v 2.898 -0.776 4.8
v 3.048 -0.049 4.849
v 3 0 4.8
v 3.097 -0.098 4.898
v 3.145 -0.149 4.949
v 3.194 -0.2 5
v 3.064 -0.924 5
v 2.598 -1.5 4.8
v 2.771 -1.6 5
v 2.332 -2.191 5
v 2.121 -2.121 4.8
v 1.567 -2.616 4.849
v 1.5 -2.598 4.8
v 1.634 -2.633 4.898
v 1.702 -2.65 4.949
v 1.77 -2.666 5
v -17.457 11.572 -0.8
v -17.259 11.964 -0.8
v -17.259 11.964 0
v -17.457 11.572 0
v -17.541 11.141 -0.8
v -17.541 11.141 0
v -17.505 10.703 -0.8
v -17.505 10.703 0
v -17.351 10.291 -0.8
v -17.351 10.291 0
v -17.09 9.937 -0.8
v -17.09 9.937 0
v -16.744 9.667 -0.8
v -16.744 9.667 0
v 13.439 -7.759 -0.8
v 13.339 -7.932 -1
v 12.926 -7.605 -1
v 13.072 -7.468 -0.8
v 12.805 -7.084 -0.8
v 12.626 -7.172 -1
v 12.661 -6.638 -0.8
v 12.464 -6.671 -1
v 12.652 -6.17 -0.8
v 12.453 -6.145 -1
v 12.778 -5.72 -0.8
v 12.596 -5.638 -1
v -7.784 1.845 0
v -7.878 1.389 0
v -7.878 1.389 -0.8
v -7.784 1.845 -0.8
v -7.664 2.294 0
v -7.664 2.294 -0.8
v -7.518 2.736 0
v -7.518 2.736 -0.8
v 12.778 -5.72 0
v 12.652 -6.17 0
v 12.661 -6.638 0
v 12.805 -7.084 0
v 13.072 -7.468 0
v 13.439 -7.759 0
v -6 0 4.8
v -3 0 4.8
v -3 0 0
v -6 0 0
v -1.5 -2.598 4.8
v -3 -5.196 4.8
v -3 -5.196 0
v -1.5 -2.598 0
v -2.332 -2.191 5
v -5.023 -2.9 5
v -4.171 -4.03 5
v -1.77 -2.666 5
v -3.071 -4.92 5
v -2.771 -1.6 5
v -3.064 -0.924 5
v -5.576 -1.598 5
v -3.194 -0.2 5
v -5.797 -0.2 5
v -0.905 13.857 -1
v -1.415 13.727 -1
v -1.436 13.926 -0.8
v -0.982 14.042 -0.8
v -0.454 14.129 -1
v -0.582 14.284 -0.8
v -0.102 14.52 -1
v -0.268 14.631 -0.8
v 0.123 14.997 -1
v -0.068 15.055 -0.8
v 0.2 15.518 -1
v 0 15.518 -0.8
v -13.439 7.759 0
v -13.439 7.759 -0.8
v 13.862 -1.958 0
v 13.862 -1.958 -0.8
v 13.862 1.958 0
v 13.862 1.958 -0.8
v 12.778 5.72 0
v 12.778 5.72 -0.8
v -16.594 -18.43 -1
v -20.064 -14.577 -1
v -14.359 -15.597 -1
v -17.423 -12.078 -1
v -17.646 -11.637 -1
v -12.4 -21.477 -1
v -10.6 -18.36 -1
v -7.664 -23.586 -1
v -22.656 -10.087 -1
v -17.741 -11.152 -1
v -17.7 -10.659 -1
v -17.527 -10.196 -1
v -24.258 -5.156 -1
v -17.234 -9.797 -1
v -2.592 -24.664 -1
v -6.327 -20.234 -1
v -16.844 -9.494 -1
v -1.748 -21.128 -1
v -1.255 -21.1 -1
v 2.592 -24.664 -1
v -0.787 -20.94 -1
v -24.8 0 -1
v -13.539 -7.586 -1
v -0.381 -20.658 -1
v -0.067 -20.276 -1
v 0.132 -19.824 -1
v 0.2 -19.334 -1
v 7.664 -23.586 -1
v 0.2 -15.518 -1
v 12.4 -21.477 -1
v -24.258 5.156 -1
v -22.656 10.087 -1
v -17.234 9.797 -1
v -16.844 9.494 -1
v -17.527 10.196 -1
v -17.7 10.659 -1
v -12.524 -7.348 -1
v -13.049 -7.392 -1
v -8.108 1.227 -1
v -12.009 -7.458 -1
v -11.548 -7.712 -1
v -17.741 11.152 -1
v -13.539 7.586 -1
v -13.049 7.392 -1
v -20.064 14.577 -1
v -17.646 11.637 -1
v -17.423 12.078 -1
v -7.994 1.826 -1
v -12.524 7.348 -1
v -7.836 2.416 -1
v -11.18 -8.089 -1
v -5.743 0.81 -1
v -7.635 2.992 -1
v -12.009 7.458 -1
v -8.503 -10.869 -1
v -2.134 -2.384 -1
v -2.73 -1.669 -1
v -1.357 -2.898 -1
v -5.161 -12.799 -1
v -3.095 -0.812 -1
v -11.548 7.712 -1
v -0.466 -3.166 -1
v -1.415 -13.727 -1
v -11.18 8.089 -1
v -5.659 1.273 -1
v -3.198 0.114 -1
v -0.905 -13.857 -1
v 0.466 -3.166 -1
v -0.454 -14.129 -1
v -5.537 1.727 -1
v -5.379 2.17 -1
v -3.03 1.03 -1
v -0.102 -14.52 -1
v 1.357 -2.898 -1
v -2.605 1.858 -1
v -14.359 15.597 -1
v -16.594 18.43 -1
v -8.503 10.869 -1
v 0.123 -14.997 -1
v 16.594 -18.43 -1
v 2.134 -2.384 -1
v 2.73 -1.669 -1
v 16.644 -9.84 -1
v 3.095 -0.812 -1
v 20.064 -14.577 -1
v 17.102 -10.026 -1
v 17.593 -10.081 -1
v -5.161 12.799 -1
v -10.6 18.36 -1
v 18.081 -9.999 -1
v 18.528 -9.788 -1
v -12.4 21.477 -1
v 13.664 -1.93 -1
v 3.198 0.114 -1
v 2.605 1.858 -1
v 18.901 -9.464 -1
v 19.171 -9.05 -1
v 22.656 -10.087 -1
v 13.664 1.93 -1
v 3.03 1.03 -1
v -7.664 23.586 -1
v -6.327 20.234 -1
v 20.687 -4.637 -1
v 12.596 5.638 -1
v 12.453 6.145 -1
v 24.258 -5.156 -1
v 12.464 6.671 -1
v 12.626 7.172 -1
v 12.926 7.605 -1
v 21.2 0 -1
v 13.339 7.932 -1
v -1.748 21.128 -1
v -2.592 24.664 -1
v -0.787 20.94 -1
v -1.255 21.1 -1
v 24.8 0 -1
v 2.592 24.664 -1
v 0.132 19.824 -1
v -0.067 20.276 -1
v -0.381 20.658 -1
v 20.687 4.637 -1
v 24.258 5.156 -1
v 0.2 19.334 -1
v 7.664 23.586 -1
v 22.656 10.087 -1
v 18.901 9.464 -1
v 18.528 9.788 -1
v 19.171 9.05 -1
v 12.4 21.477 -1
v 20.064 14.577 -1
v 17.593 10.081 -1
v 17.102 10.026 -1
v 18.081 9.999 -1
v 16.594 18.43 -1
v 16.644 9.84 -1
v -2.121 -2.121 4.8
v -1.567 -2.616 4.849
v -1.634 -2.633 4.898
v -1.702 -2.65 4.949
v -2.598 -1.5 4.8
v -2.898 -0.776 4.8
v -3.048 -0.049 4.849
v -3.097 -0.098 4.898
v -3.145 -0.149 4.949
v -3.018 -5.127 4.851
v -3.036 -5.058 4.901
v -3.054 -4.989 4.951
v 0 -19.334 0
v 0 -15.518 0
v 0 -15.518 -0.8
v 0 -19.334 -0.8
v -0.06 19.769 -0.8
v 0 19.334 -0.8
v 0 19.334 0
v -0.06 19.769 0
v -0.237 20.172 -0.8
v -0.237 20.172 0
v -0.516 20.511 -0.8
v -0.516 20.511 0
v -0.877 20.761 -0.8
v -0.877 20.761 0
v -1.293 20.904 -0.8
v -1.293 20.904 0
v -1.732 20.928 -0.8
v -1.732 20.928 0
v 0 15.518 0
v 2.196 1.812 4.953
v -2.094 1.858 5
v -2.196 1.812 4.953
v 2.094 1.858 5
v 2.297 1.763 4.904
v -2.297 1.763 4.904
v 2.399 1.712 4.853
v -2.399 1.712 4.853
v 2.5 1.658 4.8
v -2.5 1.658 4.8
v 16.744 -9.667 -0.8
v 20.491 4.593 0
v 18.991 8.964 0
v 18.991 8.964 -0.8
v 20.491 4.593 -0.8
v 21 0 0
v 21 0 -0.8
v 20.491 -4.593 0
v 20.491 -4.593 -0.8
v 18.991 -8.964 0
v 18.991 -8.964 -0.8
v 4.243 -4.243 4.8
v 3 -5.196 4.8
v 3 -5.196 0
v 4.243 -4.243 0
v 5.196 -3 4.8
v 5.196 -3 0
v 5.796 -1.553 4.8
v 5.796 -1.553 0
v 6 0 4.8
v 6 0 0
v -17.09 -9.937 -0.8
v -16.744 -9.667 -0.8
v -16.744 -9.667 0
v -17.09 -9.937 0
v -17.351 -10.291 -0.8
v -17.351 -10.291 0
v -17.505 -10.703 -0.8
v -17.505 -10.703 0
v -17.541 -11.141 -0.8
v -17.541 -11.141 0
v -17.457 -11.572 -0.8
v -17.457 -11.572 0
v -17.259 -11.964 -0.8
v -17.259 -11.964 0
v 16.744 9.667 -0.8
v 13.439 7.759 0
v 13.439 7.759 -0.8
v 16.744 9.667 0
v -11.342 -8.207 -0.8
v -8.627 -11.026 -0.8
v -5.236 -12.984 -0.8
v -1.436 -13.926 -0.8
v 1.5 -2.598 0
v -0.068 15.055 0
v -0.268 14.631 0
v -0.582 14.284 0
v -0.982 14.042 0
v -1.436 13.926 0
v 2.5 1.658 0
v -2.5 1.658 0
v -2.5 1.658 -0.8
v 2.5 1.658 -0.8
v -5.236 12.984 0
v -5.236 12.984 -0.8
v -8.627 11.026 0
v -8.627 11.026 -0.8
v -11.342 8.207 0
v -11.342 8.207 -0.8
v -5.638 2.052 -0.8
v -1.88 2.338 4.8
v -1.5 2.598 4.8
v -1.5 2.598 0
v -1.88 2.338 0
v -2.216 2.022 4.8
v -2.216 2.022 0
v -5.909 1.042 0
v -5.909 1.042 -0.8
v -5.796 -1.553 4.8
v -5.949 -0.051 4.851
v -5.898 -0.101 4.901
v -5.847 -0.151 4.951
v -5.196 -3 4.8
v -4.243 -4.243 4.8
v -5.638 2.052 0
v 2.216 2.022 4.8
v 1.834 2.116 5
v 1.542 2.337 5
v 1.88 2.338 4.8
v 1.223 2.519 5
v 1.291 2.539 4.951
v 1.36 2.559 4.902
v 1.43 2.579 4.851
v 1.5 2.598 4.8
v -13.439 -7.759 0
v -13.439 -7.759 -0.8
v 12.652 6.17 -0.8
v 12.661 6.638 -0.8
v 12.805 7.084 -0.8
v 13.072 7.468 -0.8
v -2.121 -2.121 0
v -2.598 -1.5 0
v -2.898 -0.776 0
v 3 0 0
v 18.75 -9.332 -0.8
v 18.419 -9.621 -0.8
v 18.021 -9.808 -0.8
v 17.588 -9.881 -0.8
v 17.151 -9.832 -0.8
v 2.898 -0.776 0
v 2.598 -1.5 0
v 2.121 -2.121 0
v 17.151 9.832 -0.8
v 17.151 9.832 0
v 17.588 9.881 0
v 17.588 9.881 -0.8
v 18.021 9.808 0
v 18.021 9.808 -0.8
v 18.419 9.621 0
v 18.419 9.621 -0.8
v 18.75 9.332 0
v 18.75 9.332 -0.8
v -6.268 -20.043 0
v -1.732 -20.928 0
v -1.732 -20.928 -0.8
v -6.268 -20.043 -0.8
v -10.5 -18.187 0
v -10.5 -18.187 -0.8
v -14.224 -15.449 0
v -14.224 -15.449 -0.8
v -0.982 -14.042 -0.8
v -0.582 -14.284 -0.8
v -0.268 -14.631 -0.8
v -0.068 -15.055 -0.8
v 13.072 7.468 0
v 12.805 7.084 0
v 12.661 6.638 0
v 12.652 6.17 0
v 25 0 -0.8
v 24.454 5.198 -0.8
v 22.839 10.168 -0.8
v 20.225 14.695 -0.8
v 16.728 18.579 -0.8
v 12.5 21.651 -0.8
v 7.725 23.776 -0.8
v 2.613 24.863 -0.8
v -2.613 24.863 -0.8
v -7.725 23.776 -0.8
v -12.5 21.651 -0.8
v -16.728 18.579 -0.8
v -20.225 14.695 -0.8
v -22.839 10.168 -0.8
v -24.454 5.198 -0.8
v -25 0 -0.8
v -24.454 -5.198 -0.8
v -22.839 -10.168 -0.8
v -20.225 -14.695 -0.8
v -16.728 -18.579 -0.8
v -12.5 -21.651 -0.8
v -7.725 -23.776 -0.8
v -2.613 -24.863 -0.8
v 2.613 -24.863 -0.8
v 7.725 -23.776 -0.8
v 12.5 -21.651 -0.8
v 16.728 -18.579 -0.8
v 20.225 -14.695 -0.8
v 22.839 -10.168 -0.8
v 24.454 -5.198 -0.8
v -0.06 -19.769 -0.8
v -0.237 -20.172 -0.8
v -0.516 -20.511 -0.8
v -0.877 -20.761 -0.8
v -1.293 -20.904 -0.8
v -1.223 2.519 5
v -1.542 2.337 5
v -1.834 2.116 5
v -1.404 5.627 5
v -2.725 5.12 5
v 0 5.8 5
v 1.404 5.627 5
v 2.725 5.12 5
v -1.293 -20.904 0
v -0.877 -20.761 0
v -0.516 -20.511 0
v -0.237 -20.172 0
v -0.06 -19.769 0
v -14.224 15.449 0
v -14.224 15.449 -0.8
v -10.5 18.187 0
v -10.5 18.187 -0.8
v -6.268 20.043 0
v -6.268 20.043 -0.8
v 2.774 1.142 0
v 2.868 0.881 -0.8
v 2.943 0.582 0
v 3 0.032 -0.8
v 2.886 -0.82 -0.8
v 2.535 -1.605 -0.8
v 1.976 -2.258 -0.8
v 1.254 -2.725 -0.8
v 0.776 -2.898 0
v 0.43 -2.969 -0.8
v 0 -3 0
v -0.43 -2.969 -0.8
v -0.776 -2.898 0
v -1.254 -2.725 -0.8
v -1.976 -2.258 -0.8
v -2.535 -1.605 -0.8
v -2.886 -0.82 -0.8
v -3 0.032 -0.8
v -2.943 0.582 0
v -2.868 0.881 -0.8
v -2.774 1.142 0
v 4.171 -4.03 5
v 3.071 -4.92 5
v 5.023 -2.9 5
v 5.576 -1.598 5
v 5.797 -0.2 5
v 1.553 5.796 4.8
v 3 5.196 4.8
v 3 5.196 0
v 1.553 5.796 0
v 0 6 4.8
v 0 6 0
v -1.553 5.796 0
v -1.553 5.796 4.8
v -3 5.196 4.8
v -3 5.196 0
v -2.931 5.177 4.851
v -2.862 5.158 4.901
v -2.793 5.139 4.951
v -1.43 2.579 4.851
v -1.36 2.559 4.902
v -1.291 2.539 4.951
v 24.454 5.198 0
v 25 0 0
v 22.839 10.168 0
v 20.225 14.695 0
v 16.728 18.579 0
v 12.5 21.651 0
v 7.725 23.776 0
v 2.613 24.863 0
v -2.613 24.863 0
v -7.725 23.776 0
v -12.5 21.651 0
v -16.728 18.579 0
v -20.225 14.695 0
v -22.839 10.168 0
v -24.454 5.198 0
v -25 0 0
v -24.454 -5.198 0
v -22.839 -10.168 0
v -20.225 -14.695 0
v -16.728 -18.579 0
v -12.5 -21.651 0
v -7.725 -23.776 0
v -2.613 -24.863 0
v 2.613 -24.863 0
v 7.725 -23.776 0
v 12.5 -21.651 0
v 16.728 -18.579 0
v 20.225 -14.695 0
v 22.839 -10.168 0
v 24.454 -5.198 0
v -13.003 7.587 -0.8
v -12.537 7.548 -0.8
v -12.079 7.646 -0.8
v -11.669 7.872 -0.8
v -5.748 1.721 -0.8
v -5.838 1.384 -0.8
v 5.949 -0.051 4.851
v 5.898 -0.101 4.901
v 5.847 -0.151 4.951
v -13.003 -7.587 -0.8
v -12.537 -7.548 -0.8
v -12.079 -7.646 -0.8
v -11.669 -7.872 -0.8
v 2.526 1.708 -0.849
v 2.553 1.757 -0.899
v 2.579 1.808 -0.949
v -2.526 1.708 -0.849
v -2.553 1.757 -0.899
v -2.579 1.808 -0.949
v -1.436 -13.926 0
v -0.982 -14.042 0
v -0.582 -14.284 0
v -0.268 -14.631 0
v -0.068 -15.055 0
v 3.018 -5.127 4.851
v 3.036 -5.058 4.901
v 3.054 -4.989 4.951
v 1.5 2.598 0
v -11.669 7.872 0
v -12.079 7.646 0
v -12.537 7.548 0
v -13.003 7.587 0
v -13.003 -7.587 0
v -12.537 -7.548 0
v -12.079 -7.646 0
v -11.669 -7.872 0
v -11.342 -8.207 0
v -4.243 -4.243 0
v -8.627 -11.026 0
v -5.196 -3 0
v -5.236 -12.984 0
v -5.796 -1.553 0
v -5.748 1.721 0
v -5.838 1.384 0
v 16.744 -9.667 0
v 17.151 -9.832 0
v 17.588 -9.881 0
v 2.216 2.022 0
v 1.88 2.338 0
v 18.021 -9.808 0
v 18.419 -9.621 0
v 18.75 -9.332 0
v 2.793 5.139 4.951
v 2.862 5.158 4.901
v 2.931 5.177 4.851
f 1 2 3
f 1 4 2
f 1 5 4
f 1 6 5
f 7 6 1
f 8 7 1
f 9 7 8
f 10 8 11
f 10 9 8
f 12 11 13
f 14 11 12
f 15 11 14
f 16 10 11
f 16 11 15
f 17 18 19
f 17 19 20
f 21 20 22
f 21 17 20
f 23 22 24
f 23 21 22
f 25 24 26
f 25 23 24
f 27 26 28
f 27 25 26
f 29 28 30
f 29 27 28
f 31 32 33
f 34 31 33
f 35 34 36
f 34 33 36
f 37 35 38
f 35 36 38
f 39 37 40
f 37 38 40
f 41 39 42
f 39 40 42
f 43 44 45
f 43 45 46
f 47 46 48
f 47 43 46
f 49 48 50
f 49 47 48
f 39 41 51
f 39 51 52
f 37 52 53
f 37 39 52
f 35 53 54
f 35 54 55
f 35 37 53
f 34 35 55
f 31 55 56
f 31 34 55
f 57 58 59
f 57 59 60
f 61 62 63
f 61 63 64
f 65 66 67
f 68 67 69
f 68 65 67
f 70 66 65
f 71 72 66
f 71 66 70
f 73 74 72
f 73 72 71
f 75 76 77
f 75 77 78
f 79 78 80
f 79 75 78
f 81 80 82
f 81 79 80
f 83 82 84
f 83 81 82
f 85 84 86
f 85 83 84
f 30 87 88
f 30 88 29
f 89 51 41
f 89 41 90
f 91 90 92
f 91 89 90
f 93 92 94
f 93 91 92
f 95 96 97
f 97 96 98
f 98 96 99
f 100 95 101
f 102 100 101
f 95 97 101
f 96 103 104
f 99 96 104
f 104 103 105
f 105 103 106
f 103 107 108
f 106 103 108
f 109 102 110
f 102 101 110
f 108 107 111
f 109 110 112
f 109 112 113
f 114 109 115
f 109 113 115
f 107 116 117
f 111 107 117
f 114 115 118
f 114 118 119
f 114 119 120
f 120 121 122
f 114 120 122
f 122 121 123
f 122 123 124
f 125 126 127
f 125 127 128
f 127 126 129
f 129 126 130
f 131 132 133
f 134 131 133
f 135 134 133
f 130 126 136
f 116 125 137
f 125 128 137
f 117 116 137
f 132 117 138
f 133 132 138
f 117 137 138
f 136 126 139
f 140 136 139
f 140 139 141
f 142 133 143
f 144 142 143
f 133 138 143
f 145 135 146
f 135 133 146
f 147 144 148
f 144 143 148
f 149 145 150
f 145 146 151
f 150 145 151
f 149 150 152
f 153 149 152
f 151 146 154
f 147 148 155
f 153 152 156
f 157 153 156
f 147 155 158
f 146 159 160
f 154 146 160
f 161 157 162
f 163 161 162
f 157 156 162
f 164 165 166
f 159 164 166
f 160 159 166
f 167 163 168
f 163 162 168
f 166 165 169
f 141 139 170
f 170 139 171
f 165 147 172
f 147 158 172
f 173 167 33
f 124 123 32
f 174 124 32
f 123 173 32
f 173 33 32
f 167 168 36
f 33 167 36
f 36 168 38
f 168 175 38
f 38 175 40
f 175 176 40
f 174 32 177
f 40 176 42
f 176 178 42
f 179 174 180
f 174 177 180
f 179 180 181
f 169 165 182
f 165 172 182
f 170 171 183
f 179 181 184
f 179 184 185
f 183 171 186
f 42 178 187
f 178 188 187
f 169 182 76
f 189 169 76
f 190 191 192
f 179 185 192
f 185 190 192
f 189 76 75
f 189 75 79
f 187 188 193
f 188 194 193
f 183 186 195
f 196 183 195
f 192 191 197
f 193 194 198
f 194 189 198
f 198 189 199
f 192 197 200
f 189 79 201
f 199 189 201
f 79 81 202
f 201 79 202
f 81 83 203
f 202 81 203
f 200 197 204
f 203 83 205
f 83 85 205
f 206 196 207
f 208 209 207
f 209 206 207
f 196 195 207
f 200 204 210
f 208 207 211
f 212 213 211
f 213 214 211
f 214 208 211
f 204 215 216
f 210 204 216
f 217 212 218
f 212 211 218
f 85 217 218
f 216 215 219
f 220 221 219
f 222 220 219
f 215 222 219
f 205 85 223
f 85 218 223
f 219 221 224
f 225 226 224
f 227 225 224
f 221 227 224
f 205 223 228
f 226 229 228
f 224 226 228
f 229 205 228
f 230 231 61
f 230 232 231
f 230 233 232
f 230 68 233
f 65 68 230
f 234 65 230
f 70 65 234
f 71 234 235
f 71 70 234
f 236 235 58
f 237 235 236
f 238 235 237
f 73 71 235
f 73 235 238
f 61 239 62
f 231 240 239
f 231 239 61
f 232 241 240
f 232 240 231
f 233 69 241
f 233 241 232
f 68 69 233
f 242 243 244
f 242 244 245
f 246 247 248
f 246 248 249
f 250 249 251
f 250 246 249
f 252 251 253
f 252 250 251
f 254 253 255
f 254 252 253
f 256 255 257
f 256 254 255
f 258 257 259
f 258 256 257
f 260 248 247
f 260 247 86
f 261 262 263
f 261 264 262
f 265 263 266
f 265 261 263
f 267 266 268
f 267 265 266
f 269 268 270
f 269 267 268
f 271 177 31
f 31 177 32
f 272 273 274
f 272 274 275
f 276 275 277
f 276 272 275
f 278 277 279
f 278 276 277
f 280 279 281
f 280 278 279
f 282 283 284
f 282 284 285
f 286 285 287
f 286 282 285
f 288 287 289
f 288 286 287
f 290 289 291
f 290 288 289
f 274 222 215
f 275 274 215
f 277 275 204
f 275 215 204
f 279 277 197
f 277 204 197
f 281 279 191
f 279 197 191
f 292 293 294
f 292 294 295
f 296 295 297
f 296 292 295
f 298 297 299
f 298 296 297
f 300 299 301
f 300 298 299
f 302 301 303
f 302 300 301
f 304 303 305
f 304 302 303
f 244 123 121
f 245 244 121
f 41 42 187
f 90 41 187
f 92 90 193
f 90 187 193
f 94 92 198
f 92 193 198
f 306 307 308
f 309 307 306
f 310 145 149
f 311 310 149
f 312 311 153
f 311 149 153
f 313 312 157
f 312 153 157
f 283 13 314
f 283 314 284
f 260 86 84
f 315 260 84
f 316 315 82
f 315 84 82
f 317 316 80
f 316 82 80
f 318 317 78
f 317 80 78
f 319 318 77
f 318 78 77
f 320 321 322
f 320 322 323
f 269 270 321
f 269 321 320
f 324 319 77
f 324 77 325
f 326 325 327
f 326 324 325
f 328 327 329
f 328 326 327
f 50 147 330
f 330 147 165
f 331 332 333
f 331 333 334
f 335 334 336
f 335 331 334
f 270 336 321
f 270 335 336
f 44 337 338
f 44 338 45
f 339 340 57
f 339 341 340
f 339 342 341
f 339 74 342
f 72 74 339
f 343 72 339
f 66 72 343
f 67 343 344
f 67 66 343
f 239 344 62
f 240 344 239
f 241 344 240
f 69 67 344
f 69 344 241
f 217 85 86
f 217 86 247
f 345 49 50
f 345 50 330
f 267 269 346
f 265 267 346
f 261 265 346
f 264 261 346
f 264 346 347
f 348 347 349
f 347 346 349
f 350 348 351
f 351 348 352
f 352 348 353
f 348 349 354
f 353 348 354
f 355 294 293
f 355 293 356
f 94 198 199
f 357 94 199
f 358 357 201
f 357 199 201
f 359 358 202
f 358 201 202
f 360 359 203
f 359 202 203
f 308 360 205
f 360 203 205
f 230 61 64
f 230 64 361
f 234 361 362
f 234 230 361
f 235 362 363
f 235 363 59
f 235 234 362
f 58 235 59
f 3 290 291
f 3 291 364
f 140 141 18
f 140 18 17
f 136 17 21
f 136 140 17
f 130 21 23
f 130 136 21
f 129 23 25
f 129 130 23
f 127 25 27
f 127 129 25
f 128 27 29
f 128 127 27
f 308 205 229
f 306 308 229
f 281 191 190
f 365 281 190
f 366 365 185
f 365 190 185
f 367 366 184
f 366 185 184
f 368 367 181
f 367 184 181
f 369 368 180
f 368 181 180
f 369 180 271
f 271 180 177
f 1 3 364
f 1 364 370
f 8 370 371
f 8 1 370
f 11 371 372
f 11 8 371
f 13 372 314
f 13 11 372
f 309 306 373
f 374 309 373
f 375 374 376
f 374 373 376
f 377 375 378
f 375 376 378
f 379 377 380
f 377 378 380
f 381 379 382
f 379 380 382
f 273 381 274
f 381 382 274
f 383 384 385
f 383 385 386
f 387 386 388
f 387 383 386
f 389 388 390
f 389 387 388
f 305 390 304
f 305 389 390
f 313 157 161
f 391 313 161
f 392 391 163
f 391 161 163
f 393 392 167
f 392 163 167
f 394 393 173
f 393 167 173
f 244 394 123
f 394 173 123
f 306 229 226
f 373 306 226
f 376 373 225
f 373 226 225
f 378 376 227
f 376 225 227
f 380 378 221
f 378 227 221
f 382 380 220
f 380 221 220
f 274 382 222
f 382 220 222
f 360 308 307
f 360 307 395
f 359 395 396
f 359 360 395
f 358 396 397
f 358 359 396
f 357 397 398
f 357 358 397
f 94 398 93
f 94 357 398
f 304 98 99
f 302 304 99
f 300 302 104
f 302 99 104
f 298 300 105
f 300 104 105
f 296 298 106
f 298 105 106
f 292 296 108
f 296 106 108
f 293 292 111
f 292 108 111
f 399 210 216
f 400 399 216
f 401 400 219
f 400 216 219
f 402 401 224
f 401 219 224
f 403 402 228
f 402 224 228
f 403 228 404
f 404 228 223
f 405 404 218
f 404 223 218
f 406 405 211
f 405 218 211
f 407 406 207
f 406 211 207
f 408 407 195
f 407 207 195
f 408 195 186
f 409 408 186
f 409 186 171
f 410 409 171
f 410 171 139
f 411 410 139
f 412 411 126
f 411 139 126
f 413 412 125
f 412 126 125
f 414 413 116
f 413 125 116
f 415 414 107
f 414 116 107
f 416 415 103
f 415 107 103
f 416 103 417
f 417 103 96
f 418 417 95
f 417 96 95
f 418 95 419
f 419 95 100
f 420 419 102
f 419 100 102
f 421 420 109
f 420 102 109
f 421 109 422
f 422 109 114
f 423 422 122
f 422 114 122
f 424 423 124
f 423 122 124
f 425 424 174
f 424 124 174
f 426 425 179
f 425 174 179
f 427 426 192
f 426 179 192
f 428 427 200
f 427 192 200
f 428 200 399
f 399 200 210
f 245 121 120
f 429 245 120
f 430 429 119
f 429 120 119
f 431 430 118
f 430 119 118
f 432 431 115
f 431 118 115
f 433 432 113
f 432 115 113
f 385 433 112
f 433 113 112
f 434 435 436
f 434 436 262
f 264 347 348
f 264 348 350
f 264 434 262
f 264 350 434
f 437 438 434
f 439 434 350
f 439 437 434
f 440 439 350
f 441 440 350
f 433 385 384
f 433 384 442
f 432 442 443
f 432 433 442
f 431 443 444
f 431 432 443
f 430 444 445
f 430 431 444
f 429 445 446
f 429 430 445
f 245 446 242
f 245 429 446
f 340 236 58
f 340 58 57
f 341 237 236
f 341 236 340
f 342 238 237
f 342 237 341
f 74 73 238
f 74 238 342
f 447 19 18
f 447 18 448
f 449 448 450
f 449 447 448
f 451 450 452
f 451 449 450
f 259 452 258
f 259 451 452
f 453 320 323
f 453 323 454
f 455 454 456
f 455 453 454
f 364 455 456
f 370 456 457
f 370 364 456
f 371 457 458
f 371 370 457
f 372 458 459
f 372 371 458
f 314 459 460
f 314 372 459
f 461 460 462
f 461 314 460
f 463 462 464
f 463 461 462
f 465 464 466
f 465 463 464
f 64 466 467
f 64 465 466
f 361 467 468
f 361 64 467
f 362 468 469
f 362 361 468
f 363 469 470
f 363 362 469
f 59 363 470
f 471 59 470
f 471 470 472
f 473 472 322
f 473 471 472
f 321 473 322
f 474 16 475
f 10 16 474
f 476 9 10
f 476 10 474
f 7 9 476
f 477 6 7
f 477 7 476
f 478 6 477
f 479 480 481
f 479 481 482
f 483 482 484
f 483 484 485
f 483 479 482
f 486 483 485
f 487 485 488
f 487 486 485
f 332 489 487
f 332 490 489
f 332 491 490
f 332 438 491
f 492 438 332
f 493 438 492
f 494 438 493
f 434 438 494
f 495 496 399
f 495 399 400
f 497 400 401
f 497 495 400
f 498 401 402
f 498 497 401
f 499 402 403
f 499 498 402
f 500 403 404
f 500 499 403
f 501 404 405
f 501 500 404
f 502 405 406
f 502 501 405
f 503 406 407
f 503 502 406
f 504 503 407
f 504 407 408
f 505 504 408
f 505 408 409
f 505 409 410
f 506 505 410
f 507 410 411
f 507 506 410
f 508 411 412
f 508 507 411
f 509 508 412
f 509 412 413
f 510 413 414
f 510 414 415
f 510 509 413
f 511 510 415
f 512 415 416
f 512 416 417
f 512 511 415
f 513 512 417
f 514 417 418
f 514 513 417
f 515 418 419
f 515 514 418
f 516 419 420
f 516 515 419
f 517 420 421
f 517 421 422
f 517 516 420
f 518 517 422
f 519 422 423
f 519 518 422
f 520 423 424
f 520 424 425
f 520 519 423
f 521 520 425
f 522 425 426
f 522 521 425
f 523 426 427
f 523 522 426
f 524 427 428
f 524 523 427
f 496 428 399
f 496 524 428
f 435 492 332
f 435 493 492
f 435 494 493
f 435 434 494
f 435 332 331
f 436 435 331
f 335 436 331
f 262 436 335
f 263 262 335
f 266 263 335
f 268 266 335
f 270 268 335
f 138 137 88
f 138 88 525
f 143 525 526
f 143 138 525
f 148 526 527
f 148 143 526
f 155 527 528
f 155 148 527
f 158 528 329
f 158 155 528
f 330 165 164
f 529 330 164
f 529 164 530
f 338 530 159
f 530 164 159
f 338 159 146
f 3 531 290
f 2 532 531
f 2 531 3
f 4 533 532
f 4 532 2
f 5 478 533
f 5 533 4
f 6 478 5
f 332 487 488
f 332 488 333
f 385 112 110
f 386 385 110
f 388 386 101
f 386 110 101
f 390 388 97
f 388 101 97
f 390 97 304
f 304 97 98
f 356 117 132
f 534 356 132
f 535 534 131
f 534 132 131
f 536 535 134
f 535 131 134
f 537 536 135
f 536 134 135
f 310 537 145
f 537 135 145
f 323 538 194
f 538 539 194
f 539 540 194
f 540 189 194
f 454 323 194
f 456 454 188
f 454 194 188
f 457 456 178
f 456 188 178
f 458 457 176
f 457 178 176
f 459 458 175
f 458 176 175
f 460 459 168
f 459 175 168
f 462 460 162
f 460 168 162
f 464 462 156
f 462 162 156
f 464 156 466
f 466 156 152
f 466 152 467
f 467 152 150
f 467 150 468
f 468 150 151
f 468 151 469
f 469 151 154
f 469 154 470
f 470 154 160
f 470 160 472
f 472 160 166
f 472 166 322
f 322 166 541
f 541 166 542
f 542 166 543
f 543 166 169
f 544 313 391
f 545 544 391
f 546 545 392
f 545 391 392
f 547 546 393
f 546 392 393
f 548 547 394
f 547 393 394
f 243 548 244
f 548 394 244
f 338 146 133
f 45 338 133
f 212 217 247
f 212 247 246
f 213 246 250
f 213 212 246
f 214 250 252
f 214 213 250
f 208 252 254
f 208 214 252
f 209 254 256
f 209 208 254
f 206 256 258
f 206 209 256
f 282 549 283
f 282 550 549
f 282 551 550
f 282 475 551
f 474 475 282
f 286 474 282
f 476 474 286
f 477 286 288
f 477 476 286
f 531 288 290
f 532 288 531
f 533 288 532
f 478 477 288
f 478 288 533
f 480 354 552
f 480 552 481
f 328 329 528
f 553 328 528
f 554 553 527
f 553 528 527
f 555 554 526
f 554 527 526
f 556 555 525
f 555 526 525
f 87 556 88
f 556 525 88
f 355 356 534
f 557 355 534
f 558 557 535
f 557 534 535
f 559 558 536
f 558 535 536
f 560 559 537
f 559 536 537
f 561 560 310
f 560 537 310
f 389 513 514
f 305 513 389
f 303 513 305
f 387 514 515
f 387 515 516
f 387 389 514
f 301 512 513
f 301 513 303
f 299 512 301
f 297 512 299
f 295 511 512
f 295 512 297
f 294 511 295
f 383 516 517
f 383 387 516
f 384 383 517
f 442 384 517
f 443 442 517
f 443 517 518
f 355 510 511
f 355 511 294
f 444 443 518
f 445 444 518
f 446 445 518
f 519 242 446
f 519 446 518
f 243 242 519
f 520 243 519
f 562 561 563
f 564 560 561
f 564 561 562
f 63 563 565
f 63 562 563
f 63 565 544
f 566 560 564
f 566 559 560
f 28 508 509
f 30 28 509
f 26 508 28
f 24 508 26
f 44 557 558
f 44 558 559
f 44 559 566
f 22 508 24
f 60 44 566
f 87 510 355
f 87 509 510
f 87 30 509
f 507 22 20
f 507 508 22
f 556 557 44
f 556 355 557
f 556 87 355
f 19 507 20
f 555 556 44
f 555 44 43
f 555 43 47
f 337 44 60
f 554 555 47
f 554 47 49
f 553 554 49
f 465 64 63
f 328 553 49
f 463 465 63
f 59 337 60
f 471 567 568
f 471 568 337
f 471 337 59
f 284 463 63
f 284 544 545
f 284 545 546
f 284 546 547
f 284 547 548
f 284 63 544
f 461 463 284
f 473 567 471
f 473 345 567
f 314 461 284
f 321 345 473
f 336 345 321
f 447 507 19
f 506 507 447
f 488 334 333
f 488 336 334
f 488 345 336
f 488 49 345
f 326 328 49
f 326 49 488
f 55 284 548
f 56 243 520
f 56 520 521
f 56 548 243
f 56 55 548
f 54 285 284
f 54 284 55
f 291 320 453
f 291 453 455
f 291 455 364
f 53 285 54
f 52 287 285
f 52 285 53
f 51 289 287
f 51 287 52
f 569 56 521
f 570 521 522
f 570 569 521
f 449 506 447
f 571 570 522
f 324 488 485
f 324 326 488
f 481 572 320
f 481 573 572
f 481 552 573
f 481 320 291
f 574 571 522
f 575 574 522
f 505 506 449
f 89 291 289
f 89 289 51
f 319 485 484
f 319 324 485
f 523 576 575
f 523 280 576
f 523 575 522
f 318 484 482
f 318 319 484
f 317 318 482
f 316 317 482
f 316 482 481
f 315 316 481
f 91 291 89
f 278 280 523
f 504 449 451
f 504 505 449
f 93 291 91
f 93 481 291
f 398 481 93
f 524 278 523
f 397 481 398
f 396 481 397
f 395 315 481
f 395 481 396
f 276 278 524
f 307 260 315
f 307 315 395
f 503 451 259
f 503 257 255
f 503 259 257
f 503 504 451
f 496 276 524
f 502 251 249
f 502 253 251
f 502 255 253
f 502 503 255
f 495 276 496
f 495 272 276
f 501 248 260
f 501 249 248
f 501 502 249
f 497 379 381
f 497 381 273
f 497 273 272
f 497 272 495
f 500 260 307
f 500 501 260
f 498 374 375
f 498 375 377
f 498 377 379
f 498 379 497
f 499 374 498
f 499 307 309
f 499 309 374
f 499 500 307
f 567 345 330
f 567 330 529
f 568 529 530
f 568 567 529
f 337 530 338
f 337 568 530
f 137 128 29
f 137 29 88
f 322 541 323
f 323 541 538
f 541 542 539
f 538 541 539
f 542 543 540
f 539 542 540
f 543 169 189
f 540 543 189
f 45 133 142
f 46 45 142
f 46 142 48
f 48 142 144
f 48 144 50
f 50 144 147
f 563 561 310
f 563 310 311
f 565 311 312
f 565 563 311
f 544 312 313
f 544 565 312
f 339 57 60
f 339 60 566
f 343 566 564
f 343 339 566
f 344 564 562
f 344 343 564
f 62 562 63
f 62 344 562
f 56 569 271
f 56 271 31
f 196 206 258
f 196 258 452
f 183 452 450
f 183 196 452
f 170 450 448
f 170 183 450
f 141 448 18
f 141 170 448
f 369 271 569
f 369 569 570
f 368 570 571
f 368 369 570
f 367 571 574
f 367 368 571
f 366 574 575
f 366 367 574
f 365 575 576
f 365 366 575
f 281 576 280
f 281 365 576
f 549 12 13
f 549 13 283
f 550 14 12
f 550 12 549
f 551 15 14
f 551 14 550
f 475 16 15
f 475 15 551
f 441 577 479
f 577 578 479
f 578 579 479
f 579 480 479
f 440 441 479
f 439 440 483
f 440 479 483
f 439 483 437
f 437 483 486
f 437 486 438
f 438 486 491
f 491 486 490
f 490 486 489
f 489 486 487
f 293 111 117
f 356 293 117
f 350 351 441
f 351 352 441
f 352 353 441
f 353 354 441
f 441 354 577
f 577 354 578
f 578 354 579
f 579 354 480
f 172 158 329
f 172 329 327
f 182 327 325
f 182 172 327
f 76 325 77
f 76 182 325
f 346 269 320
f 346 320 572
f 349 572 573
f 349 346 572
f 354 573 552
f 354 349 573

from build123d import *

# Parameters (mm, degrees)
SKETCH_1_R      = 25
EXTRUDE_1_DEPTH = 1
FILLET_1_R      = 1.6
EXTRUDE_START   = 5
EXTRUDE_3_DEPTH = 5
CHAMFER_3_SIZE  = 0.2


with BuildPart() as part:
    # 草图1 → 凸台-拉伸1 (new body)
    with BuildSketch(Plane.XY):
        Circle(SKETCH_1_R)
        with BuildLine():
            Line((-5.908846518, 1.041889066), (-7.878462024, 1.389185421))
            ThreePointArc((-7.878462024, 1.389185421), (-7.72740661, 2.070552361), (-7.517540966, 2.736161147))
            Line((-7.517540966, 2.736161147), (-5.638155725, 2.05212086))
            ThreePointArc((-5.638155725, 2.05212086), (-5.795554958, 1.552914271), (-5.908846518, 1.041889066))
        make_face(mode=Mode.SUBTRACT)
        with BuildLine():
            Line((-2.5, 1.658312395), (2.5, 1.658312395))
            ThreePointArc((2.5, 1.658312395), (0, -3), (-2.5, 1.658312395))
        make_face(mode=Mode.SUBTRACT)
        with BuildLine():
            ThreePointArc((-12.124355653, -7), (-7, -12.124355653), (0, -14))
            Line((0, -14), (0, -21))
            ThreePointArc((0, -21), (-10.5, -18.186533479), (-18.186533479, -10.5))
            Line((-18.186533479, -10.5), (-12.124355653, -7))
        make_face(mode=Mode.SUBTRACT)
        with BuildLine():
            ThreePointArc((0, 14), (-7, 12.124355653), (-12.124355653, 7))
            Line((-12.124355653, 7), (-18.186533479, 10.5))
            ThreePointArc((-18.186533479, 10.5), (-10.5, 18.186533479), (0, 21))
            Line((0, 21), (0, 14))
        make_face(mode=Mode.SUBTRACT)
        with BuildLine():
            ThreePointArc((18.186533479, 10.5), (21, 0), (18.186533479, -10.5))
            Line((18.186533479, -10.5), (12.124355653, -7))
            ThreePointArc((12.124355653, -7), (14, 0), (12.124355653, 7))
            Line((12.124355653, 7), (18.186533479, 10.5))
        make_face(mode=Mode.SUBTRACT)
    extrude(amount=-EXTRUDE_1_DEPTH)

    # 圆角1
    fillet_1_edges = [part.edges().sort_by_distance(p)[0] for p in [
        (-18.186533479, -10.5, -0.5),
        (0, -21, -0.5),
        (0, -14, -0.5),
        (-12.124355653, -7, -0.5),
        (18.186533479, -10.5, -0.5),
        (18.186533479, 10.5, -0.5),
        (12.124355653, 7, -0.5),
        (12.124355653, -7, -0.5),
        (-18.186533479, 10.5, -0.5),
        (-12.124355653, 7, -0.5),
        (0, 14, -0.5),
        (0, 21, -0.5),
    ]]
    fillet(fillet_1_edges, radius=FILLET_1_R)

    # 草图1<5> → 凸台-拉伸3 (add)
    with BuildSketch(Plane.XY.offset(EXTRUDE_START)):
        with BuildLine():
            ThreePointArc((-1.5, 2.598076211), (-2.054455891, 2.186140662), (-2.5, 1.658312395))
            Line((-2.5, 1.658312395), (2.5, 1.658312395))
            ThreePointArc((2.5, 1.658312395), (2.054455891, 2.186140662), (1.5, 2.598076211))
            Line((1.5, 2.598076211), (3, 5.196152423))
            ThreePointArc((3, 5.196152423), (0, 6), (-3, 5.196152423))
            Line((-3, 5.196152423), (-1.5, 2.598076211))
        make_face()
        with BuildLine():
            ThreePointArc((-1.5, -2.598076211), (-2.598076211, -1.5), (-3, 0))
            Line((-3, 0), (-6, 0))
            ThreePointArc((-6, 0), (-5.196152423, -3), (-3, -5.196152423))
            Line((-3, -5.196152423), (-1.5, -2.598076211))
        make_face()
        with BuildLine():
            Line((6, 0), (3, 0))
            ThreePointArc((3, 0), (2.598076211, -1.5), (1.5, -2.598076211))
            Line((1.5, -2.598076211), (3, -5.196152423))
            ThreePointArc((3, -5.196152423), (5.196152423, -3), (6, 0))
        make_face()
    extrude(amount=-EXTRUDE_3_DEPTH)

    # 倒角3
    chamfer_3_edges = [part.edges().sort_by_distance(p)[0] for p in [
        (18.021198676, 9.808386563, -1),
        (12.716572017, 6.866149549, -1),
        (12.716572017, -6.866149549, -1),
        (-17.504911272, 10.702622579, -1),
        (-12.304545944, 7.579799641, -1),
        (-0.412026073, 14.44594919, -1),
        (-0.516287404, 20.511009142, -1),
        (0, 1.658312395, -1),
        (-7.72740661, 2.070552361, -1),
        (-2.25, 3.897114317, 5),
        (0, 1.658312395, 5),
        (2.054455891, 2.186140662, 5),
        (2.25, 3.897114317, 5),
        (0, 6, 5),
        (-2.054455891, 2.186140662, 5),
        (-2.25, -3.897114317, 5),
        (-2.598076211, -1.5, 5),
        (-4.5, 0, 5),
        (-5.196152423, -3, 5),
        (4.5, 0, 5),
        (2.598076211, -1.5, 5),
        (2.25, -3.897114317, 5),
        (5.196152423, -3, 5),
        (-6.577848346, 2.394141003, -1),
        (-5.795554958, 1.552914271, -1),
        (-6.893654271, 1.215537244, -1),
        (-25, 0, -1),
        (-10.5, -18.186533479, -1),
        (-15.091202728, -8.712909958, -1),
        (-7, -12.124355653, -1),
        (0, -17.425819915, -1),
        (21, 0, -1),
        (15.091202728, -8.712909958, -1),
        (15.091202728, 8.712909958, -1),
        (14, 0, -1),
        (-15.091202728, 8.712909958, -1),
        (-10.5, 18.186533479, -1),
        (-7, 12.124355653, -1),
        (0, 17.425819915, -1),
        (-17.504911272, -10.702622579, -1),
        (0, -3, -1),
        (-12.304545944, -7.579799641, -1),
        (-0.412026073, -14.44594919, -1),
        (-0.516287404, -20.511009142, -1),
        (18.021198676, -9.808386563, -1),
    ]]
    chamfer(chamfer_3_edges, length=CHAMFER_3_SIZE)


solid = part.part
